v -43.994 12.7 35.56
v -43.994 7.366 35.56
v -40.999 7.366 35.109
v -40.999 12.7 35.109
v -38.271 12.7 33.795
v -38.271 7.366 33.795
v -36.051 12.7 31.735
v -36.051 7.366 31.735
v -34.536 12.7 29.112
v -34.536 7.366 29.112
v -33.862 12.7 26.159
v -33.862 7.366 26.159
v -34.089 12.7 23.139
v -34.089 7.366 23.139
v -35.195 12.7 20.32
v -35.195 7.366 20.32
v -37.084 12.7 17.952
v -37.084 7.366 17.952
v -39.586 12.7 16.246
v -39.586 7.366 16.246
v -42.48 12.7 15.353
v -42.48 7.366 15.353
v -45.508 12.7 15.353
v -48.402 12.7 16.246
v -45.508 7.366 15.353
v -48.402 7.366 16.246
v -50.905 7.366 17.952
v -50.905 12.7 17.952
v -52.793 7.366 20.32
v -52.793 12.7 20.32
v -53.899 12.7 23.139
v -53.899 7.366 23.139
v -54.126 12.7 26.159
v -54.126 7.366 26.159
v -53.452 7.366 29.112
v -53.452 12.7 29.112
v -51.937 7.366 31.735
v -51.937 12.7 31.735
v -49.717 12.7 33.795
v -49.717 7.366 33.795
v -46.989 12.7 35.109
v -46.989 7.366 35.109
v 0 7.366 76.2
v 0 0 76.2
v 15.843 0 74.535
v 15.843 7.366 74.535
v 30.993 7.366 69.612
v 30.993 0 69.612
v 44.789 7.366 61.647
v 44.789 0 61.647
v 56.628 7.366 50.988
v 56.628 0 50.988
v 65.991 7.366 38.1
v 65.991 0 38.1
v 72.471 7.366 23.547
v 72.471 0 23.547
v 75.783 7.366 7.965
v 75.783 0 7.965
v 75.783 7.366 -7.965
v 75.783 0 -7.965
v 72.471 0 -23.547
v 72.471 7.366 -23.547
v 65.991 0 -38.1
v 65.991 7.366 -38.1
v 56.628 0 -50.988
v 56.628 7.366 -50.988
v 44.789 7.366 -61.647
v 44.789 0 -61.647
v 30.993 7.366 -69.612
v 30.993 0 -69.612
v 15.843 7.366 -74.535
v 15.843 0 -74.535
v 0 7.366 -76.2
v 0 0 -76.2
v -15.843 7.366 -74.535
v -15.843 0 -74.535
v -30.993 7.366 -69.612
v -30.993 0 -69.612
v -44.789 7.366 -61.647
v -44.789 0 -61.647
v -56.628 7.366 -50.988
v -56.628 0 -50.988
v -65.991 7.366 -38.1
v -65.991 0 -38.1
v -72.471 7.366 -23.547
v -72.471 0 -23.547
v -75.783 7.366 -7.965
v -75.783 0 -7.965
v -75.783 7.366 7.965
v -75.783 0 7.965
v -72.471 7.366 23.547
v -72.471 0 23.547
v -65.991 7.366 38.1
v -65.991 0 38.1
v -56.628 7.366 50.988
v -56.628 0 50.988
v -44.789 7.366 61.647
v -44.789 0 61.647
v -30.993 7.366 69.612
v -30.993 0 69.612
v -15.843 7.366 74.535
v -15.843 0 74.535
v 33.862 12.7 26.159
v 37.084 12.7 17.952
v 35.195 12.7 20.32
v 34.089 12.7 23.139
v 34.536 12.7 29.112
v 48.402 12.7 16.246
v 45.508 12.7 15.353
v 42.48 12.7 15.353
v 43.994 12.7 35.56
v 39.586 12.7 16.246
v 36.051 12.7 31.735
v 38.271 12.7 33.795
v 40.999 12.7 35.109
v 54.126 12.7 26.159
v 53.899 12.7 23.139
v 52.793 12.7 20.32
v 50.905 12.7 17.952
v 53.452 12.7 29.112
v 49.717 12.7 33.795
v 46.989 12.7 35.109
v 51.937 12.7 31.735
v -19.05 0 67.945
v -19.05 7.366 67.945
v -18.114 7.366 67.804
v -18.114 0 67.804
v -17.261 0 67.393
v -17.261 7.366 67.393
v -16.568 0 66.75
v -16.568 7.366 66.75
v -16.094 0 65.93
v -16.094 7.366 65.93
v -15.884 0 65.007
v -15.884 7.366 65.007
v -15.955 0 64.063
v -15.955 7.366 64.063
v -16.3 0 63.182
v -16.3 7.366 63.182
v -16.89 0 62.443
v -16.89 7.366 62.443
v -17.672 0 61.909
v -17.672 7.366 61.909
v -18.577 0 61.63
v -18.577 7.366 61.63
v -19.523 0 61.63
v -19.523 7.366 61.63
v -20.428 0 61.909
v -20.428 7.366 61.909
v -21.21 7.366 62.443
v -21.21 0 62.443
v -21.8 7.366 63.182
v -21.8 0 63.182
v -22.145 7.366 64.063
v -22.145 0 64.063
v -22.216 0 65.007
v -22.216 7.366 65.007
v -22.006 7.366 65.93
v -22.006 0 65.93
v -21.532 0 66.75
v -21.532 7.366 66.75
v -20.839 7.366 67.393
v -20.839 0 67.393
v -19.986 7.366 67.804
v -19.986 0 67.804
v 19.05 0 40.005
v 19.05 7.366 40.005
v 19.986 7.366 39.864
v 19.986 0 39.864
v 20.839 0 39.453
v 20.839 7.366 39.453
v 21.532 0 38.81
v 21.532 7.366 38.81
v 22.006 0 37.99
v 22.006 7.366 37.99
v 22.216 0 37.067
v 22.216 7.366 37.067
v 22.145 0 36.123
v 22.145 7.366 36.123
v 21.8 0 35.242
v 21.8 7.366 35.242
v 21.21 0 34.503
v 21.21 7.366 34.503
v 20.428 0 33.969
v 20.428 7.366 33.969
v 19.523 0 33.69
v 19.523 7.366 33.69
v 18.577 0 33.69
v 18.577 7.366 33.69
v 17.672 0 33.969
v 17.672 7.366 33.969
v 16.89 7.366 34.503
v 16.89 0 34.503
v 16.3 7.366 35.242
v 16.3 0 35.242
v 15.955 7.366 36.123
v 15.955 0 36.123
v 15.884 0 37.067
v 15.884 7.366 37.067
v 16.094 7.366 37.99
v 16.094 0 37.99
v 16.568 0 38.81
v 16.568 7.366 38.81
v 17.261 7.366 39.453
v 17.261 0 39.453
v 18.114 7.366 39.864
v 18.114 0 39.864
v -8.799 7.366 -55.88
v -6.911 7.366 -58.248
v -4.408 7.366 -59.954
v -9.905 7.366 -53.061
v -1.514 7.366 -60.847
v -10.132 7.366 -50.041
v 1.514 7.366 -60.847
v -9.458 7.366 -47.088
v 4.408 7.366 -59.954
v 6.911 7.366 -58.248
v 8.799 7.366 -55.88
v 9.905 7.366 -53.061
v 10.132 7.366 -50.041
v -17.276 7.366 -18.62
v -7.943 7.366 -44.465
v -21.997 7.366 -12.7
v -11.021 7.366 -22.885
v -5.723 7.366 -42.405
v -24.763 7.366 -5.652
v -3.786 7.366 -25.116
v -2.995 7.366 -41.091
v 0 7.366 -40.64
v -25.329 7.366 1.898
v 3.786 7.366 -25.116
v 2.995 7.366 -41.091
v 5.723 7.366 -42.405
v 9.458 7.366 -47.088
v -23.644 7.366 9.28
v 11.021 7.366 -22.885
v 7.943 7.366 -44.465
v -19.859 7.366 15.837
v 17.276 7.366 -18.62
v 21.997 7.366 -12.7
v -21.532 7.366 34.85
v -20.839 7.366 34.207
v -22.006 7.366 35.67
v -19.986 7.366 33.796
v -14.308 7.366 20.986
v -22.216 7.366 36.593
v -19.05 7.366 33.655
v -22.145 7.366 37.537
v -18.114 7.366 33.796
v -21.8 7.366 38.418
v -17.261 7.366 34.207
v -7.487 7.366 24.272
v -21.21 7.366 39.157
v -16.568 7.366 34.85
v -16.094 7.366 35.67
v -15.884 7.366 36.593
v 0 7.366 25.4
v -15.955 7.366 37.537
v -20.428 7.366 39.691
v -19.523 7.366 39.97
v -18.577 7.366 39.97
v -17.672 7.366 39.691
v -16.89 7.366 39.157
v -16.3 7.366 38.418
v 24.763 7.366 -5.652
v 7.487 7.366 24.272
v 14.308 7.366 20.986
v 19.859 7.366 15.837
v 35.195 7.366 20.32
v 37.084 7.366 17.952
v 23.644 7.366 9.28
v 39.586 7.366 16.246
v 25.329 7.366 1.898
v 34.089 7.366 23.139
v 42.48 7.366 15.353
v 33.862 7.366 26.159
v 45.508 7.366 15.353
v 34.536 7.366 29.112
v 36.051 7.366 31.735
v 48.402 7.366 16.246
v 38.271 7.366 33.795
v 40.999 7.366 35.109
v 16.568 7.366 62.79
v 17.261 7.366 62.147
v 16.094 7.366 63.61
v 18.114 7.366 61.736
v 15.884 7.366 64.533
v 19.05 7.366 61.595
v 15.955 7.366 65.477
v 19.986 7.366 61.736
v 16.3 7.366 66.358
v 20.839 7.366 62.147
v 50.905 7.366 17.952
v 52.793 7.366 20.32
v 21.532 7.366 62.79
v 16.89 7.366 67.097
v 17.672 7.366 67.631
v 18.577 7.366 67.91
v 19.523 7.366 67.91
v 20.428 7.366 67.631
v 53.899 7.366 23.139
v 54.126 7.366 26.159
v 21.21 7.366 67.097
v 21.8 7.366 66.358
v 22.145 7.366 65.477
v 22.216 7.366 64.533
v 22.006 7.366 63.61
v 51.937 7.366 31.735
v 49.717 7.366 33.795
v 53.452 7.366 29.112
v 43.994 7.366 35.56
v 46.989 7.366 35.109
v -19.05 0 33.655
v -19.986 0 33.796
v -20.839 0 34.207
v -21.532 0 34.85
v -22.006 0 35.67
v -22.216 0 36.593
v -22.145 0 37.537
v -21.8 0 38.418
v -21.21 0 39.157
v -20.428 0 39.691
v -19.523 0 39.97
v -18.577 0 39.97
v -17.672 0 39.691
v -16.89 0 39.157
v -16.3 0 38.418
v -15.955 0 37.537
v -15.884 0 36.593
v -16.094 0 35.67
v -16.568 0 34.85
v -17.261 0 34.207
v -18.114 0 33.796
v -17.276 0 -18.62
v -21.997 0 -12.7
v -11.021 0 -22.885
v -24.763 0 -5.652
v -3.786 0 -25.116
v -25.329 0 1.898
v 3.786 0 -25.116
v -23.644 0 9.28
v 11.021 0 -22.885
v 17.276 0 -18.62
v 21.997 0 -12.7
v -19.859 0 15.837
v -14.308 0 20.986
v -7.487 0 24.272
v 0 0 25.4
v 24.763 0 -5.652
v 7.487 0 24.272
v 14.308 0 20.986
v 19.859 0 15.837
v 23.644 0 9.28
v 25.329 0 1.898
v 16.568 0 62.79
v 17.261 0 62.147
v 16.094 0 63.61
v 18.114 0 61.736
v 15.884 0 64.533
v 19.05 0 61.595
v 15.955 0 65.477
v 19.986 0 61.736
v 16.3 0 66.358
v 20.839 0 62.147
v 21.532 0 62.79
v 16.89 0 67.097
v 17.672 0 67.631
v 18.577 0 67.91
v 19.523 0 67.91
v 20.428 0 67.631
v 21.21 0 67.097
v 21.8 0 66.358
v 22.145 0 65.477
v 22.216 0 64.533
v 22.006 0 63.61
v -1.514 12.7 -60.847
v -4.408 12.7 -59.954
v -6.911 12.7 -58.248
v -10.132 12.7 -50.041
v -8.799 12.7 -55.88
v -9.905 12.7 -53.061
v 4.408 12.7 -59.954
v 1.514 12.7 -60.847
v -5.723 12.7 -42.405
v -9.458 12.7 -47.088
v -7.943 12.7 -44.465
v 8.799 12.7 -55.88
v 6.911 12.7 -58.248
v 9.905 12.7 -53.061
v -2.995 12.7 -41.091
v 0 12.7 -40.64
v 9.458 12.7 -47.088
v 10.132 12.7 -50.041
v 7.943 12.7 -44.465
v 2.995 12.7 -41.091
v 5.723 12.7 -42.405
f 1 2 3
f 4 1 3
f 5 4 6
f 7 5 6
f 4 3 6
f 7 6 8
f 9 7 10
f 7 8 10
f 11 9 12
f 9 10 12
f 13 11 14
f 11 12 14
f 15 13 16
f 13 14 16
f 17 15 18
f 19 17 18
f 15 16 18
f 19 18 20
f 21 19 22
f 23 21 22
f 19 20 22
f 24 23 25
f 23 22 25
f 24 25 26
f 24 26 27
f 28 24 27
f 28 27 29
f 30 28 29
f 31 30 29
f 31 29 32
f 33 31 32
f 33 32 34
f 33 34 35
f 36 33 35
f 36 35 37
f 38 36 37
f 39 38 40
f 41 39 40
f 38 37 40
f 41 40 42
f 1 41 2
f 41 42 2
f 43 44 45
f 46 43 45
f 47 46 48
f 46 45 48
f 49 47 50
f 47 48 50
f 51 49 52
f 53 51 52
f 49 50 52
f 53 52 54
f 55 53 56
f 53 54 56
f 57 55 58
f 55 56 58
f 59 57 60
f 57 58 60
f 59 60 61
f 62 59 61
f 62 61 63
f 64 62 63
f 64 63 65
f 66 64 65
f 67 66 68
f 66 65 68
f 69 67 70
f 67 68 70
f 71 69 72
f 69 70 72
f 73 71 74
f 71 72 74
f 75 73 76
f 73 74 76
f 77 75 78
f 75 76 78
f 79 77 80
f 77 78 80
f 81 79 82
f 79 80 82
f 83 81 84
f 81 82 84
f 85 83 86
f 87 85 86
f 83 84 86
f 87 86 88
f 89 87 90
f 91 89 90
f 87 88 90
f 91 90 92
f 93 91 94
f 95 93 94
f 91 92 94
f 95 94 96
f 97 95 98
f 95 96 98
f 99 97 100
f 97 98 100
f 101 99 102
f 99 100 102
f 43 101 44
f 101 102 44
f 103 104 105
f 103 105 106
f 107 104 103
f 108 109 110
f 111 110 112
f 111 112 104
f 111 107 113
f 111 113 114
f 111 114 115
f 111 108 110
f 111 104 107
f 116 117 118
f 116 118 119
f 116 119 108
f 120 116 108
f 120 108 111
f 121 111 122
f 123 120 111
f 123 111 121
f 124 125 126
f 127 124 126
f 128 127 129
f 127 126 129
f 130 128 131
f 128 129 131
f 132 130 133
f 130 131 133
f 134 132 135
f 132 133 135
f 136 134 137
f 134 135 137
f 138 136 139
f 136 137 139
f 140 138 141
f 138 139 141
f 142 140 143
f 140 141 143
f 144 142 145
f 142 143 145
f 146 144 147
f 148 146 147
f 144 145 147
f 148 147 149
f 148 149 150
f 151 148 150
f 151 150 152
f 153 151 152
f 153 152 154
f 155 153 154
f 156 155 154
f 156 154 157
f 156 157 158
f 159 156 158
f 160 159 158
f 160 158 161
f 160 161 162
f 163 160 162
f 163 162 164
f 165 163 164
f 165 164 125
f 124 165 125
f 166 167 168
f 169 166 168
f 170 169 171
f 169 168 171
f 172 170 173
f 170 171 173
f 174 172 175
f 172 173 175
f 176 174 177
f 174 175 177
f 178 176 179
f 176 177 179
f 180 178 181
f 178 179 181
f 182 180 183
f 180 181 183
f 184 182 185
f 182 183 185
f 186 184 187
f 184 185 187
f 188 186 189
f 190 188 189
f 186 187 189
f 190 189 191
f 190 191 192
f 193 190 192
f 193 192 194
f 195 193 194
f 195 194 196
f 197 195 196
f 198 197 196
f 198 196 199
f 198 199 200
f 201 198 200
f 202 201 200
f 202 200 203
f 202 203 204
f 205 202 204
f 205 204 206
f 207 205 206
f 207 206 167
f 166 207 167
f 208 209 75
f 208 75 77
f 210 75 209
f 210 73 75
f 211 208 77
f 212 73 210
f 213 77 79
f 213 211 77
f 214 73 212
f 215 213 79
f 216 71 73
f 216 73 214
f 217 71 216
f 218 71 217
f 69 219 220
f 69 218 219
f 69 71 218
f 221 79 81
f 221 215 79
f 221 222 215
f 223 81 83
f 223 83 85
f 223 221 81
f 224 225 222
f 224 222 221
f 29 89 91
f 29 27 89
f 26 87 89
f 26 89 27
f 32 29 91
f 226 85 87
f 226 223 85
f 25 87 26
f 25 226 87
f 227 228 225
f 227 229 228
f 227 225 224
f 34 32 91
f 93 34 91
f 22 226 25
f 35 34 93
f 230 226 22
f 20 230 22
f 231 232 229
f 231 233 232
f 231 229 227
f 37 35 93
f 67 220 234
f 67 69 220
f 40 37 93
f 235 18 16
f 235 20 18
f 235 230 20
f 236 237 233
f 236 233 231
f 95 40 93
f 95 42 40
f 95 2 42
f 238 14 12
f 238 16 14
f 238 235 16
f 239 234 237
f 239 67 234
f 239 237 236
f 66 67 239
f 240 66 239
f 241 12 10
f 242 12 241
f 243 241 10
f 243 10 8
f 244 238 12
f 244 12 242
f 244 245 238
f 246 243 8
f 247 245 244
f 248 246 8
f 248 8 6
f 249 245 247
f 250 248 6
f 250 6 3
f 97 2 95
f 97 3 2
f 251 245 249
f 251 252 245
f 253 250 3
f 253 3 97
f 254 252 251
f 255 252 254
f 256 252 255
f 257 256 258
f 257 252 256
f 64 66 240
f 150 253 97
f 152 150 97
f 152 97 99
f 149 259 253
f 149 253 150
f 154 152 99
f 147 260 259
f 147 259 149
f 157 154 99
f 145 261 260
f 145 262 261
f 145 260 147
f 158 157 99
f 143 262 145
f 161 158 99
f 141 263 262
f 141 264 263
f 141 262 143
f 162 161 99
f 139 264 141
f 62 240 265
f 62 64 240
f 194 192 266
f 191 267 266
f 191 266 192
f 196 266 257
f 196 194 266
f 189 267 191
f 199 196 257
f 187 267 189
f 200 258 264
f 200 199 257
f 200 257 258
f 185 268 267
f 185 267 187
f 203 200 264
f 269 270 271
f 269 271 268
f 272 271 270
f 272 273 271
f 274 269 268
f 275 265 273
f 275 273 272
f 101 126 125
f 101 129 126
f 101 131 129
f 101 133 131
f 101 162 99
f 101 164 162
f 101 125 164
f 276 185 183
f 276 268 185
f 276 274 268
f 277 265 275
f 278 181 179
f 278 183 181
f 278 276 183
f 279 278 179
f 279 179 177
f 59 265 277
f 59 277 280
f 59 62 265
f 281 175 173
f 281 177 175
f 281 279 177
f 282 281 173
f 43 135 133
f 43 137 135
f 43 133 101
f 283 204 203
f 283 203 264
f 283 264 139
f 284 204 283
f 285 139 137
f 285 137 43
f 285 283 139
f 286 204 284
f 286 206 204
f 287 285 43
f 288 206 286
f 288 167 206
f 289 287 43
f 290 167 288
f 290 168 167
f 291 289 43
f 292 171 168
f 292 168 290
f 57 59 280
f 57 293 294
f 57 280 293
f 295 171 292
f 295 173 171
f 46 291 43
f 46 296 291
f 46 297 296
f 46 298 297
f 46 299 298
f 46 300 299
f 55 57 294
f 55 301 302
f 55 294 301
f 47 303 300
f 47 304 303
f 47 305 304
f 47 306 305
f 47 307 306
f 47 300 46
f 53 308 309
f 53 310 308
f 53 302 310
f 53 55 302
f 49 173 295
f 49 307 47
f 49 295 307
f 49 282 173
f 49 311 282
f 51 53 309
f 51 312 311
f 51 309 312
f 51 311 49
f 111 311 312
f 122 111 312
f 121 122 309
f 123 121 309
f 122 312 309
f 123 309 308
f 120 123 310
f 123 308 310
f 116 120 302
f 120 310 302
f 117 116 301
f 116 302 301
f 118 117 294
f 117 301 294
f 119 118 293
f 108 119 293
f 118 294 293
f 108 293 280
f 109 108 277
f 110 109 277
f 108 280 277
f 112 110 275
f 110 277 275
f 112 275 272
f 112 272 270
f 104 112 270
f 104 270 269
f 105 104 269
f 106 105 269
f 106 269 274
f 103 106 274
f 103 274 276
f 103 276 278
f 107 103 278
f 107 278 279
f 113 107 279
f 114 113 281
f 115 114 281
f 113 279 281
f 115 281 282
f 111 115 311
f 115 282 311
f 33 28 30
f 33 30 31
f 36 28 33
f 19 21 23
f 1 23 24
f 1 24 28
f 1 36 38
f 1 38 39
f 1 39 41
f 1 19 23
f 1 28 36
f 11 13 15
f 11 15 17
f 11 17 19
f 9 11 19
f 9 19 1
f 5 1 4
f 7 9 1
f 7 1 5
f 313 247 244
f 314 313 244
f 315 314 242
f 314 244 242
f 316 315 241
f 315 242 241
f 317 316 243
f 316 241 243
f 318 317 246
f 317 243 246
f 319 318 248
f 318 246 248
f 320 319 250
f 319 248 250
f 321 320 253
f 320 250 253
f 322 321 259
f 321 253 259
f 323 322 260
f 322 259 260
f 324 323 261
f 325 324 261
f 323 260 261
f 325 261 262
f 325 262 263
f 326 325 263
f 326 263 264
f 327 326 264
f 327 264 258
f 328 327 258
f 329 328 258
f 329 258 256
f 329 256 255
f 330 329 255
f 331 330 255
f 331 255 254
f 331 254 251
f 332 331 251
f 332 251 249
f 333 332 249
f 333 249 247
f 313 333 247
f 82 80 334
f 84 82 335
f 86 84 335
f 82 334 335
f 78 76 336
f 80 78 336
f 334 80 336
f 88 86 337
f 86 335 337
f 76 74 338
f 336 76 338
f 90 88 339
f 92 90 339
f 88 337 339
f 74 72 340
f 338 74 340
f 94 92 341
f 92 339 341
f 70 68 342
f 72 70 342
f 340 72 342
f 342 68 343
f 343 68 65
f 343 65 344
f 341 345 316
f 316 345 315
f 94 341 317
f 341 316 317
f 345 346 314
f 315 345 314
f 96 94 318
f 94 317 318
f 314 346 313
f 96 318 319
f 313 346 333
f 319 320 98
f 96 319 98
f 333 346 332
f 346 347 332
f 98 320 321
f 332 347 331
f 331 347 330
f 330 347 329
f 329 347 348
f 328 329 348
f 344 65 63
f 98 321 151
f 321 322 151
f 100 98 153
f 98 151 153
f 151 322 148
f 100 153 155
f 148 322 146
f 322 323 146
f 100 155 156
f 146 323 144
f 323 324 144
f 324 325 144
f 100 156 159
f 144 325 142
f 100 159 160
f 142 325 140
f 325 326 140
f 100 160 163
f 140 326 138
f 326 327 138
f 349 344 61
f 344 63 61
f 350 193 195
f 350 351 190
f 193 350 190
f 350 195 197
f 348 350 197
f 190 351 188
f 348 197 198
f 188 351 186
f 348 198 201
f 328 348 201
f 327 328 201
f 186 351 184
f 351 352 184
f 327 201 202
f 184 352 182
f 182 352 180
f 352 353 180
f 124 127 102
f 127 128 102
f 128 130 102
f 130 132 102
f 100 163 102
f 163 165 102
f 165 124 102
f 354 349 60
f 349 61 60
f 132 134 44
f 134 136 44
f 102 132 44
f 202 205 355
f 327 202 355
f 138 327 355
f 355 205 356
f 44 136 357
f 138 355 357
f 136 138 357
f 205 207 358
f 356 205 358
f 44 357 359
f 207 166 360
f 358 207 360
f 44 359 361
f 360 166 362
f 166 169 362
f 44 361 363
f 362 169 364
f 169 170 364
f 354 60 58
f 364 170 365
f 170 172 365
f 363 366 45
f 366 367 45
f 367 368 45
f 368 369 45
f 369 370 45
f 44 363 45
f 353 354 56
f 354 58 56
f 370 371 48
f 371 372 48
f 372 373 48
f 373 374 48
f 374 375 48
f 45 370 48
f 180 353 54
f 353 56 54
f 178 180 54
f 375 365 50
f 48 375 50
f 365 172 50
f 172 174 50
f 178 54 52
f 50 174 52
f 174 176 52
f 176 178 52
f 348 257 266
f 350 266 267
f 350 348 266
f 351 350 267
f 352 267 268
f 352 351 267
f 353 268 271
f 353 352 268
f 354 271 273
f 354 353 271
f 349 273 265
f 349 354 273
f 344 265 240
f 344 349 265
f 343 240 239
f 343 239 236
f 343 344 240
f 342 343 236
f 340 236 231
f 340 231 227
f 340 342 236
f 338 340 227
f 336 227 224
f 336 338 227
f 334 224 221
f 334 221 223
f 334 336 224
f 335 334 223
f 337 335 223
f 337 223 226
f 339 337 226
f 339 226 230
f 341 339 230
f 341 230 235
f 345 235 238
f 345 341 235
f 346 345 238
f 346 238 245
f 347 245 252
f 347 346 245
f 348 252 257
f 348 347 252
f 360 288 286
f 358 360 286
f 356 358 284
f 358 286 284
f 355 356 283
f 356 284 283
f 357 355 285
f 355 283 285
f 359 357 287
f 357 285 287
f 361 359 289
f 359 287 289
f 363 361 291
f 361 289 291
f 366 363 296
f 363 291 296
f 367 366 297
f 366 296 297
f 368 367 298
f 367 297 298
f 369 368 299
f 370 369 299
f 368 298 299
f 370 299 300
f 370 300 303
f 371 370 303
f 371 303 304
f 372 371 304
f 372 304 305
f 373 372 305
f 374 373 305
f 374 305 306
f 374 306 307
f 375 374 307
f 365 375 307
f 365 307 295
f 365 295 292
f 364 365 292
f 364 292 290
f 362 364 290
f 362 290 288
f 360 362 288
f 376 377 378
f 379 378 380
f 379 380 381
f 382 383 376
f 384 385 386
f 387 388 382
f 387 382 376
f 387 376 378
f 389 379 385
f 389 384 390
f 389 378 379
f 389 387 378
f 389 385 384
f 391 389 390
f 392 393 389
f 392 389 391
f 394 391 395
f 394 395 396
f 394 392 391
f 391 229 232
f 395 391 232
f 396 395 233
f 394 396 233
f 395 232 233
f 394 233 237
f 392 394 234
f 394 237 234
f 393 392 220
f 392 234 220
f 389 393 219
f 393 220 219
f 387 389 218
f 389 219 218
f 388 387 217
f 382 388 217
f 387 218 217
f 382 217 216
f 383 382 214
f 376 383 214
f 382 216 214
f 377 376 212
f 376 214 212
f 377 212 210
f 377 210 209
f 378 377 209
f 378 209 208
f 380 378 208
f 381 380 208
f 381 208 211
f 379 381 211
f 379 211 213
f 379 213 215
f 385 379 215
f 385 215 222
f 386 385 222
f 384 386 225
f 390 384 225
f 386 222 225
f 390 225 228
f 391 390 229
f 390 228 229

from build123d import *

# Parameters (mm, degrees)
SKETCH1_R           = 76.2
SKETCH1_R_2         = 25.4
BOSS_EXTRUDE1_DEPTH = 7.366
SKETCH2_R           = 10.16
BOSS_EXTRUDE2_DEPTH = 5.334
SKETCH3_R           = 3.175
CUT_EXTRUDE1_DEPTH  = 109.014526597


with BuildPart() as part:
    # Sketch1 → Boss-Extrude1 (new body)
    with BuildSketch(Plane(origin=(0, 0, 0), x_dir=(1, 0, 0), z_dir=(0, 1, 0))):
        with Locations(Location((0, 0, 0), (0, 0, 270))):
            Circle(SKETCH1_R)
        with Locations(Location((0, 0, 0), (0, 0, 270))):
            Circle(SKETCH1_R_2, mode=Mode.SUBTRACT)
    extrude(amount=BOSS_EXTRUDE1_DEPTH)

    # Sketch2 → Boss-Extrude2 (add)
    with BuildSketch(Plane(origin=(0, 7.366, 0), x_dir=(1, 0, 0), z_dir=(0, 1, 0))):
        with Locations(Location((0, 50.8, 0), (0, 0, 270))):
            Circle(SKETCH2_R)
        with Locations(Location((-43.994090512, -25.4, 0), (0, 0, 270))):
            Circle(SKETCH2_R)
        with Locations(Location((43.994090512, -25.4, 0), (0, 0, 270))):
            Circle(SKETCH2_R)
    extrude(amount=BOSS_EXTRUDE2_DEPTH)

    # Sketch3 → Cut-Extrude1 (cut, through all)
    with BuildSketch(Plane(origin=(0, 7.366, 0), x_dir=(1, 0, 0), z_dir=(0, 1, 0))):
        with Locations(Location((-19.05, -64.77, 0), (0, 0, 270))):
            Circle(SKETCH3_R)
        with Locations(Location((19.05, -36.83, 0), (0, 0, 270))):
            Circle(SKETCH3_R)
        with Locations(Location((19.05, -64.77, 0), (0, 0, 90))):
            Circle(SKETCH3_R)
        with Locations(Location((-19.05, -36.83, 0), (0, 0, 90))):
            Circle(SKETCH3_R)
    extrude(amount=-CUT_EXTRUDE1_DEPTH, mode=Mode.SUBTRACT)


solid = part.part
